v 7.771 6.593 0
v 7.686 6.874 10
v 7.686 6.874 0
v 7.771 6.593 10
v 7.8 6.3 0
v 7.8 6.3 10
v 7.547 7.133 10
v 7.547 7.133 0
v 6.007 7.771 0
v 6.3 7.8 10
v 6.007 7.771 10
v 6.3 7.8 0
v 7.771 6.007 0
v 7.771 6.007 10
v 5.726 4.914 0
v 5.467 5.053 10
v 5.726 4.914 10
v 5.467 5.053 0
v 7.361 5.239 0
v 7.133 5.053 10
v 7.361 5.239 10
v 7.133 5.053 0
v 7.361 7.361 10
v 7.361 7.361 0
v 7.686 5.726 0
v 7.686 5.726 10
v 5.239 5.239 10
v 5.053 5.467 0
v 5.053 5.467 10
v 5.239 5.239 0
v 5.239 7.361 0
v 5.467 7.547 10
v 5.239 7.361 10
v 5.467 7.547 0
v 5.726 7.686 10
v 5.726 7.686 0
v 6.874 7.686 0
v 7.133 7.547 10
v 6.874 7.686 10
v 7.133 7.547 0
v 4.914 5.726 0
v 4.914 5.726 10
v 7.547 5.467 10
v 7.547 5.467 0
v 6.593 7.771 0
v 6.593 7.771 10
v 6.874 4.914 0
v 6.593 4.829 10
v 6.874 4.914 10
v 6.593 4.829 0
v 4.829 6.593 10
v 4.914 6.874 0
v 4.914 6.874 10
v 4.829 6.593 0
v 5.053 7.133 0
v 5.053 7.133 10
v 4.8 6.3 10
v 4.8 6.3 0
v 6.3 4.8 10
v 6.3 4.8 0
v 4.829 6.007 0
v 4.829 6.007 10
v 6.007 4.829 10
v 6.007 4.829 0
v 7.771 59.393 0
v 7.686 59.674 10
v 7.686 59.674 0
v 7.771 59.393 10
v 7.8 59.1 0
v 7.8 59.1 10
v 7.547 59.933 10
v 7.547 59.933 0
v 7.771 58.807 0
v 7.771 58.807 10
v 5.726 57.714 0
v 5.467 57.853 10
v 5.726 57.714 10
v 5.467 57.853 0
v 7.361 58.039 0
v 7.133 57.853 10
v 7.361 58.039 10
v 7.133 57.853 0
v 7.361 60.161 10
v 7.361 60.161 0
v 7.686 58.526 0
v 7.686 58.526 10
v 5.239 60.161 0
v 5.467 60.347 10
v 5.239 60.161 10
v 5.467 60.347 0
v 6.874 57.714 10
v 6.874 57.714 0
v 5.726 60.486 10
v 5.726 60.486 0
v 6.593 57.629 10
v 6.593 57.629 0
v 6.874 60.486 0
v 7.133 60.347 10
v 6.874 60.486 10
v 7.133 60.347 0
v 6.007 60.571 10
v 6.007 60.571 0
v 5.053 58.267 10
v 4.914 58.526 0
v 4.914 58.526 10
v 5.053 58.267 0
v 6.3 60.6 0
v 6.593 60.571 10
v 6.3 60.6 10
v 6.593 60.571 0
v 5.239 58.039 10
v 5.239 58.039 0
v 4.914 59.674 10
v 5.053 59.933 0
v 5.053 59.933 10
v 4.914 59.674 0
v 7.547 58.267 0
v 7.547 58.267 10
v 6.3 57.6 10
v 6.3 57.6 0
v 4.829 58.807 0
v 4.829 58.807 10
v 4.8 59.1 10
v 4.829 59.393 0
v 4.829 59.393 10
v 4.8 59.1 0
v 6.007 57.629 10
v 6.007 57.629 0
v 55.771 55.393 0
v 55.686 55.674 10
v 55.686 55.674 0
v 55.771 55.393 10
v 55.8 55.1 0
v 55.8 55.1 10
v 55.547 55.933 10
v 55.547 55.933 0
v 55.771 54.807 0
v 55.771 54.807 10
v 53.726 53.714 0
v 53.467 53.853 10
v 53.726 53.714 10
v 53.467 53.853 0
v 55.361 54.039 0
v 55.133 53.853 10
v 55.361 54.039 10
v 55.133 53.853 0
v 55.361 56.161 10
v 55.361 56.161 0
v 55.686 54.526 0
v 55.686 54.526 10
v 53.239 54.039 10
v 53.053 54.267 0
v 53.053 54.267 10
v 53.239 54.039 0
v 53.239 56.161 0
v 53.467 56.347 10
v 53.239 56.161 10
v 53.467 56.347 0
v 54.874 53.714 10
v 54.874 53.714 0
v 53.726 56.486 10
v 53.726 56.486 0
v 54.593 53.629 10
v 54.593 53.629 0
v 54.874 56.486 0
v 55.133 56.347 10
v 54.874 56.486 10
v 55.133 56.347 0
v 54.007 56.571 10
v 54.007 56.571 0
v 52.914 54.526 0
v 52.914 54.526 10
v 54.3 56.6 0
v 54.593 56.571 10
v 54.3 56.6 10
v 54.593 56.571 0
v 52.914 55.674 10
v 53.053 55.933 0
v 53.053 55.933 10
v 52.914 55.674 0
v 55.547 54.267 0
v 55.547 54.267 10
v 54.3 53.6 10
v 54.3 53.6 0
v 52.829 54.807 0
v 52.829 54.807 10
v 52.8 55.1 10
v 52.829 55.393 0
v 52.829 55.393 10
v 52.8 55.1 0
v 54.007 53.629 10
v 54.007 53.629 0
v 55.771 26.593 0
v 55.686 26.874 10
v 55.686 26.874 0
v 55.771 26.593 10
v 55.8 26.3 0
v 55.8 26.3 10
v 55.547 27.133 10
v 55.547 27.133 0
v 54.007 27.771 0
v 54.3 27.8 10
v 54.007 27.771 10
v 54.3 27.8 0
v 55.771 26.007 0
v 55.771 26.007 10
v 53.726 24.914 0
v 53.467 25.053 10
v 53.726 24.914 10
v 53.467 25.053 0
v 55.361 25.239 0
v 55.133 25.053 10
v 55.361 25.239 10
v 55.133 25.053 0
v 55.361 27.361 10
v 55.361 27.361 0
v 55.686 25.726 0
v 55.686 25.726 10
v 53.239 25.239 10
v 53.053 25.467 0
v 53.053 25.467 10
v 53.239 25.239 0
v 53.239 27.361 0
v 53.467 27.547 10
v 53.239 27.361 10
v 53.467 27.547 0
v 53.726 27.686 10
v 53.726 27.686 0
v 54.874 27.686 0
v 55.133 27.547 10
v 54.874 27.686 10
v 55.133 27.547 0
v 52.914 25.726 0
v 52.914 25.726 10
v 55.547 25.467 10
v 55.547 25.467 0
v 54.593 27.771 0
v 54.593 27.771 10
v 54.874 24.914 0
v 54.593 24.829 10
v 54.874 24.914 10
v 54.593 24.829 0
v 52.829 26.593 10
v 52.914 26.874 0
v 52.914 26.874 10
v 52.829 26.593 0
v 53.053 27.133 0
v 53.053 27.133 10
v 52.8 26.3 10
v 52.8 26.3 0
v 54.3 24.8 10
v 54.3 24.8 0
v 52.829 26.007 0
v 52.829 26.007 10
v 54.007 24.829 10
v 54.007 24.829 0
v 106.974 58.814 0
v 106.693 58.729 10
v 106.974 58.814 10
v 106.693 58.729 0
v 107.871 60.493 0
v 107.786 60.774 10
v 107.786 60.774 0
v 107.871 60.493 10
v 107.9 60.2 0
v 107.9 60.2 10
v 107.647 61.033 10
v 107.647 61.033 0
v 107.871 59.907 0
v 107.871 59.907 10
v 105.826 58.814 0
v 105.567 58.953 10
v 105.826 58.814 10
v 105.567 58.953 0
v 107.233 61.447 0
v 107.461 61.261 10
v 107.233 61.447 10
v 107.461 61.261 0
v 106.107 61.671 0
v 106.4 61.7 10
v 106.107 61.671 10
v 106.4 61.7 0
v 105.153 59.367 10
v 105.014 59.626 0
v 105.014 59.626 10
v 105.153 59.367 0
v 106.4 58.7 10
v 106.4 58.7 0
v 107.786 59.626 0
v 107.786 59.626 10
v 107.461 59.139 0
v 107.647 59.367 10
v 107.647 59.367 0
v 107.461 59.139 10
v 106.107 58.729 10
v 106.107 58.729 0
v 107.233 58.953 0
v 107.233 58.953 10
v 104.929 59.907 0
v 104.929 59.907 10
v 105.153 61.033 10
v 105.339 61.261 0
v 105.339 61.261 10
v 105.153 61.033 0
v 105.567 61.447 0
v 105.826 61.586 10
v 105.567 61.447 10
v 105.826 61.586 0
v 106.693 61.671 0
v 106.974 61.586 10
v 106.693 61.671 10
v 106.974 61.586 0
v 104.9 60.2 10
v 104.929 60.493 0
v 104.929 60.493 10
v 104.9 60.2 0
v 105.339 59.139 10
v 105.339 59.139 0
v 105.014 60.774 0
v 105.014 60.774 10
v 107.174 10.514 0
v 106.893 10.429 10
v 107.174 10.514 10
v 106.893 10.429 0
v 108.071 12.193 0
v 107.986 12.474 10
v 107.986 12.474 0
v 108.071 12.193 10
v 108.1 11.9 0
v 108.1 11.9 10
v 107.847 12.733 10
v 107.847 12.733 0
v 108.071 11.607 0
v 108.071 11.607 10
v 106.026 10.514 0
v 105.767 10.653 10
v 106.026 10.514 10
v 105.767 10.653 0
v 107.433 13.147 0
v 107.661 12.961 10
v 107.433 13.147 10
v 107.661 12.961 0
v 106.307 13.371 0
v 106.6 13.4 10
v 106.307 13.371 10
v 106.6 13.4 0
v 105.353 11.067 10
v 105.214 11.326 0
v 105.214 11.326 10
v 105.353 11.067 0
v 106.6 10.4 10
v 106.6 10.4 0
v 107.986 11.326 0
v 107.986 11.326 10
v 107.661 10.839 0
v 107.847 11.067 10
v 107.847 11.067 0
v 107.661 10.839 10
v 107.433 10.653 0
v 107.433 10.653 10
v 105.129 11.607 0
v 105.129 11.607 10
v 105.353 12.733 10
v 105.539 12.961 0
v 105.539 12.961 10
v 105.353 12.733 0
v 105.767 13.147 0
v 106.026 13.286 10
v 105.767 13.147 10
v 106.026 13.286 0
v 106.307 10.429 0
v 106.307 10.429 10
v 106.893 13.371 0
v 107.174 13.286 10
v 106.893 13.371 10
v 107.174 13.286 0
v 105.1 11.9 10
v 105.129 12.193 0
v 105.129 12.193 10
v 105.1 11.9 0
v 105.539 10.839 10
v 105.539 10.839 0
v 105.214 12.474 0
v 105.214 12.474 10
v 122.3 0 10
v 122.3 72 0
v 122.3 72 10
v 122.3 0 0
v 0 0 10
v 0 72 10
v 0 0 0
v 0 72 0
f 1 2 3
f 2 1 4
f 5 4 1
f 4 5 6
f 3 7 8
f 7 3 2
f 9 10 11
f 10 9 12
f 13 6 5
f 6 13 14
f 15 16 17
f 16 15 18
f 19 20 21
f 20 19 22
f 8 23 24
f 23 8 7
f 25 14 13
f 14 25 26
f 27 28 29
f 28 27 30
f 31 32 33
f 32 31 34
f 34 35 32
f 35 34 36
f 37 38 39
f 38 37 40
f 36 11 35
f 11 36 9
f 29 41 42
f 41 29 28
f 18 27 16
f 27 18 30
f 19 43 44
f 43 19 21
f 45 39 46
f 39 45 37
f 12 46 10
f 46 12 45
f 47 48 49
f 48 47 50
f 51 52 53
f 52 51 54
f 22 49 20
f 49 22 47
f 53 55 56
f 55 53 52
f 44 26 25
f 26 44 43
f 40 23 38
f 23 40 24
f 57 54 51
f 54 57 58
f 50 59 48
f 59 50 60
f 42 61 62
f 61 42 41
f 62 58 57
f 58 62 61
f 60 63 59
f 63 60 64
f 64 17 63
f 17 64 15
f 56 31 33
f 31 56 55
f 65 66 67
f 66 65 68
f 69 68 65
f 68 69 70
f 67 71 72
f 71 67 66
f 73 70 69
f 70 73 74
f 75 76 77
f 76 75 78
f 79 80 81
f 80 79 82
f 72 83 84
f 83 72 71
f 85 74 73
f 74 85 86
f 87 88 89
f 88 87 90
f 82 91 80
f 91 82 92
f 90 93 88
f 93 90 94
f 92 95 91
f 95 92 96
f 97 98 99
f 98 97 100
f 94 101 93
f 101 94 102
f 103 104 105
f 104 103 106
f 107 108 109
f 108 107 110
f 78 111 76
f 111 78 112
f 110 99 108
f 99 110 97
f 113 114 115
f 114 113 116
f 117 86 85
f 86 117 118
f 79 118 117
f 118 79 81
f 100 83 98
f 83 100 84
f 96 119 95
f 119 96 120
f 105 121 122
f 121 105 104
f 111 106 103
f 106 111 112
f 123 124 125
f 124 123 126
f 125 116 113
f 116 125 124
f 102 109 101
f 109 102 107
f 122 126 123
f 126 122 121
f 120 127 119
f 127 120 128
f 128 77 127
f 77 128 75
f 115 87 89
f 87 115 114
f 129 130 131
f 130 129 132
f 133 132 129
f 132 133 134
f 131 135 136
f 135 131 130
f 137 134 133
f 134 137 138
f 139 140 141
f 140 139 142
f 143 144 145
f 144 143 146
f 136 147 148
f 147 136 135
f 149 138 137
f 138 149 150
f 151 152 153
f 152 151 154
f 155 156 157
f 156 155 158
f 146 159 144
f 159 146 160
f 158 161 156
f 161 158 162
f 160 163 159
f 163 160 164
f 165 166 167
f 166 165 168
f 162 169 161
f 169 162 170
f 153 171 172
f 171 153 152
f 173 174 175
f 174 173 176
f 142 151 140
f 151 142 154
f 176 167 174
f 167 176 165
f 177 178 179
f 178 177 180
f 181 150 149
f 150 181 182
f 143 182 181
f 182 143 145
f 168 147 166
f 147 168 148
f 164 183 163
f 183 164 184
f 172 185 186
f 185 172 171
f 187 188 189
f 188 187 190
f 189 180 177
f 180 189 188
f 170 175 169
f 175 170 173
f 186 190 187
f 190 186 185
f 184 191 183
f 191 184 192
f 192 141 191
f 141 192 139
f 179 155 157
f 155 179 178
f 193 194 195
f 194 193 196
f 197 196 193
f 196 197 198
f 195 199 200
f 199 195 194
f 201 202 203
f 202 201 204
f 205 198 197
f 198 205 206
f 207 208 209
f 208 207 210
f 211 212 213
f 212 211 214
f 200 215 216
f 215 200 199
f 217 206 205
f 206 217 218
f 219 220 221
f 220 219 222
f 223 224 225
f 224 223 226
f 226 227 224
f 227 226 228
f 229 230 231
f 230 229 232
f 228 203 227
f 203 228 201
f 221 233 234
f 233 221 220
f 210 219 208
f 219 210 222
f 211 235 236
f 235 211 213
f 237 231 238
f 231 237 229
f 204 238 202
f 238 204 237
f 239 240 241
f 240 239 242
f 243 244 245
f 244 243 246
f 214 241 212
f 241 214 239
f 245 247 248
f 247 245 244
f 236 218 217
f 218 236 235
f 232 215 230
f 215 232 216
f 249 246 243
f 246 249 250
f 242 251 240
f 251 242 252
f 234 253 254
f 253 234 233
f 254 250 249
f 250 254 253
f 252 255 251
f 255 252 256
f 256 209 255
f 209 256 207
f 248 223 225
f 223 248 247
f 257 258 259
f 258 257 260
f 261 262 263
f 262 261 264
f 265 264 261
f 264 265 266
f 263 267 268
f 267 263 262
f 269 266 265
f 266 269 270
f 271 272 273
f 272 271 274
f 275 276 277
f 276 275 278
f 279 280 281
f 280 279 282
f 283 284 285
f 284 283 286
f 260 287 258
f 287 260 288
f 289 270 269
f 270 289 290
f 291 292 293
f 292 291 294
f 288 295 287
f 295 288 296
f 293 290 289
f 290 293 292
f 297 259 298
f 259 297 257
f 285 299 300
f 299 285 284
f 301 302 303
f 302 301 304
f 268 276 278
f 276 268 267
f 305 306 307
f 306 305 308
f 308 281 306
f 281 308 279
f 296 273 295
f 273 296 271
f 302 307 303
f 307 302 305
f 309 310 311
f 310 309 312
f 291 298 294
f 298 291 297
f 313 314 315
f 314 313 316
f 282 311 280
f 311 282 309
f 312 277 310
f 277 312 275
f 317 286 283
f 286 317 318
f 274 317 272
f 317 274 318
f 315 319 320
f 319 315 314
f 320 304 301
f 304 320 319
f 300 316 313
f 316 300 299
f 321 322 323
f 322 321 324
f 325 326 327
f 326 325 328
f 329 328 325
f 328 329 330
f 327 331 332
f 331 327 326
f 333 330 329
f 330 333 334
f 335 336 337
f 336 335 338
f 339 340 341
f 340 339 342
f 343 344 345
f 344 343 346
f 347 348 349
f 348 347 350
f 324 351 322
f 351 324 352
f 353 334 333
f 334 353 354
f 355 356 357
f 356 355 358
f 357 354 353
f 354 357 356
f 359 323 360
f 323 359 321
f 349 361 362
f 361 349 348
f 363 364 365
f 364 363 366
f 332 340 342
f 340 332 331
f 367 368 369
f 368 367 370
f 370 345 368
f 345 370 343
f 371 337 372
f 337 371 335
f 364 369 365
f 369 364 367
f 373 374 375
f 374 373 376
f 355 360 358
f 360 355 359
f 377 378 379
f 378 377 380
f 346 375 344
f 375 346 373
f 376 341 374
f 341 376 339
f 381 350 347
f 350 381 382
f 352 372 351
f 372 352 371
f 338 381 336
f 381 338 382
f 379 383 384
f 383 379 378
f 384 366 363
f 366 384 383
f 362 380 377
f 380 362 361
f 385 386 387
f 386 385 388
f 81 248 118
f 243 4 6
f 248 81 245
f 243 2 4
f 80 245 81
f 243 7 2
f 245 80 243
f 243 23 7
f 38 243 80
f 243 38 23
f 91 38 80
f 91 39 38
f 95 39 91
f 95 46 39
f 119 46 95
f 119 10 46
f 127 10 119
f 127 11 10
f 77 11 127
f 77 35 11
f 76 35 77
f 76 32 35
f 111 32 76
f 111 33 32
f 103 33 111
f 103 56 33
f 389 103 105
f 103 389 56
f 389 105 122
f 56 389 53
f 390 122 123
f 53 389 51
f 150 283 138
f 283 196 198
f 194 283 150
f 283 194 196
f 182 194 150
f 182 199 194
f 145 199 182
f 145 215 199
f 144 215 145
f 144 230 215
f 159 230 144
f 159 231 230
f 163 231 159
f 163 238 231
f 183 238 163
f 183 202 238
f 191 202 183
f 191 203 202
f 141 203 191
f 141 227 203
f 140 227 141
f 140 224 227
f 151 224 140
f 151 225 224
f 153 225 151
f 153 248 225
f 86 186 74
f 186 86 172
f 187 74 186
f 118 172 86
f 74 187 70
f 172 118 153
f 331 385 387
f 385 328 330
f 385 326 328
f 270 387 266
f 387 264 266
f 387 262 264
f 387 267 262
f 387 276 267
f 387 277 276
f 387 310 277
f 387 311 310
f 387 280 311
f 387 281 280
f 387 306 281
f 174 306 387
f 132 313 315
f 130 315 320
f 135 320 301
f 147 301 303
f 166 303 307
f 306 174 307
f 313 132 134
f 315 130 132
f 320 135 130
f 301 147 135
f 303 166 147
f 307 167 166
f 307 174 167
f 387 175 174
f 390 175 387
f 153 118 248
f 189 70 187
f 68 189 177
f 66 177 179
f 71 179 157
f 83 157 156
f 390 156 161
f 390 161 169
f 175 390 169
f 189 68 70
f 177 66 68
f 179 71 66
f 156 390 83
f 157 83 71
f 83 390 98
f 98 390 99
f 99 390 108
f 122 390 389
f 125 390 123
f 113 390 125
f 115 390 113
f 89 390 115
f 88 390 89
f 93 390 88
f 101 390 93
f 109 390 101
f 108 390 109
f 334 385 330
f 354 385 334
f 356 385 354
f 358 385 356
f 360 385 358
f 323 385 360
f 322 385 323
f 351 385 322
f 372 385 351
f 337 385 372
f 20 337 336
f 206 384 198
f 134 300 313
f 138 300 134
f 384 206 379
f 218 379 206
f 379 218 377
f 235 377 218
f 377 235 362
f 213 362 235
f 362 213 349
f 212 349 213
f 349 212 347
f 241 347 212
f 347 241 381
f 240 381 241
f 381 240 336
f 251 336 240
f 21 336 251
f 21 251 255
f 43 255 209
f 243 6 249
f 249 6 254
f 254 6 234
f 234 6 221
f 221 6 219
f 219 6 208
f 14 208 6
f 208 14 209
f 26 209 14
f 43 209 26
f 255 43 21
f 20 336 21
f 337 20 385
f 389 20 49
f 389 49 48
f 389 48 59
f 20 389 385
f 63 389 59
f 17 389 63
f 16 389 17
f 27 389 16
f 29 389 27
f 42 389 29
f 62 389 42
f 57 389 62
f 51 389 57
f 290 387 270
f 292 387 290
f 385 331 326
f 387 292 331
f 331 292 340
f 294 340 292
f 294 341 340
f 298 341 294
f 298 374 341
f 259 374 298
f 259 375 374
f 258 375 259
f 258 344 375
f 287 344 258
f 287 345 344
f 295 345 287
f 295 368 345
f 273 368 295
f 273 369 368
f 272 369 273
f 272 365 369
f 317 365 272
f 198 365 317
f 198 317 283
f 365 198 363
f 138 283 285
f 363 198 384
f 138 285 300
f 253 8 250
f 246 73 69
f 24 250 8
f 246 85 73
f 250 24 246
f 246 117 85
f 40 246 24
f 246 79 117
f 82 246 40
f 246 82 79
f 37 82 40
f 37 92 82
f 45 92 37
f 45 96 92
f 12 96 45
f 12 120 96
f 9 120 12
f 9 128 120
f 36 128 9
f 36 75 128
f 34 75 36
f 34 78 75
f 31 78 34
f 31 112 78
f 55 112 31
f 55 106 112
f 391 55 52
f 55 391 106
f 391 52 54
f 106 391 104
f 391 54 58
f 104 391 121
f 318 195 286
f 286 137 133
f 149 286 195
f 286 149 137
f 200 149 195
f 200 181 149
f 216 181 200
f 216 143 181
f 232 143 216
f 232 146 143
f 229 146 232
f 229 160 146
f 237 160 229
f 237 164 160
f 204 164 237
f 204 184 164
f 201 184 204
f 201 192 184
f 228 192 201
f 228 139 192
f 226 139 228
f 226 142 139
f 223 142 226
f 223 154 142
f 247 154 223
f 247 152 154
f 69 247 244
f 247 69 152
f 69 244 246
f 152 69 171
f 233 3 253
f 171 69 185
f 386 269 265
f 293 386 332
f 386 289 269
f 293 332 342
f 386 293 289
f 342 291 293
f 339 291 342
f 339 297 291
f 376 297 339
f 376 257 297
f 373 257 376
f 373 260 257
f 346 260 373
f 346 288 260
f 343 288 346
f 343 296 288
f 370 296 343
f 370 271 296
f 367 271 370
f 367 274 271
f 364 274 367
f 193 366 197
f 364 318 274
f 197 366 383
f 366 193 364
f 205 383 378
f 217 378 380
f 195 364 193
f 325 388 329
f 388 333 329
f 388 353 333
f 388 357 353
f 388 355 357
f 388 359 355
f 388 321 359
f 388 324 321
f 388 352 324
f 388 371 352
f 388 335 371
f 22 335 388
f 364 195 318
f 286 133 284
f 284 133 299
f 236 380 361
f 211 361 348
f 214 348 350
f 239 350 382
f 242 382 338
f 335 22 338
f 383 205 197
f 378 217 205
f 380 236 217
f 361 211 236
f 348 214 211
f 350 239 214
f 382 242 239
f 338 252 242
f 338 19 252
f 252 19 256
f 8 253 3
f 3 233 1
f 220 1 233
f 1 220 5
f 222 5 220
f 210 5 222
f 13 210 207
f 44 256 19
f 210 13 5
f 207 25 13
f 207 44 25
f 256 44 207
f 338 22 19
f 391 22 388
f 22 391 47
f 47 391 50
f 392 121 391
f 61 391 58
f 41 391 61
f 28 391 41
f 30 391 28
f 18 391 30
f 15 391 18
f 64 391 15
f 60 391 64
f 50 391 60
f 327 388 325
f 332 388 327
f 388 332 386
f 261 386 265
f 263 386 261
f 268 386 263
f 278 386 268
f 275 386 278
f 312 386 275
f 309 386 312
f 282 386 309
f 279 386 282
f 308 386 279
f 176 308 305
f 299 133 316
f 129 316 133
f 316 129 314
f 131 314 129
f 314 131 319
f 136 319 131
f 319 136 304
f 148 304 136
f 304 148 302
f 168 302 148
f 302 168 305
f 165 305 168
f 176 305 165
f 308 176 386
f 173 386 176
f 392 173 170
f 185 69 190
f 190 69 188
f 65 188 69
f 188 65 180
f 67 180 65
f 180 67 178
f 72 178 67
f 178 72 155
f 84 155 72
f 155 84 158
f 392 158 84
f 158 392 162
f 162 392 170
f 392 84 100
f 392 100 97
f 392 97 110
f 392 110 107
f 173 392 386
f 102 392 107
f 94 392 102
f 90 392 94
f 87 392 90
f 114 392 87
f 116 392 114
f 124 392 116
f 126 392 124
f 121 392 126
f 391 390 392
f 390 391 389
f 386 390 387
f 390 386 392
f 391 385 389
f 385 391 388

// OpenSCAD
// file: dimensions.scad
arduino_board_dim = [116 + 6.3, 65.7 + 6.3, 10];

arduino_board_mounting_holes_r = 3 / 2;
arduino_board_mounting_holes_pos = [
    [0 + 6.3, 0 + 6.3],
    [0 + 6.3, 52.8 + 6.3],
    [48 + 6.3, 48.8 + 6.3],
    [48 + 6.3, 20 + 6.3],
    [100.1 + 6.3, 53.9 + 6.3],
    [100.3 + 6.3, 5.6 + 6.3]
];

camera_base_r = 50 / 2;
camera_base_h = 3;
camera_base_cut = 15;
camera_foot_r = 15 / 2;
camera_foot_h = 3;
camera_sphere_r = 30 / 2;
camera_objective_r = [18 / 2, 16 / 2];
camera_objective_l = 10;
camera_top_dim = [10, 70, 30];
camera_mic_grid_dim = [10, 50, 10];
// main file
include <dimensions.scad>

module arduino_board()
{
    difference()
    {
        cube(arduino_board_dim);
        for(i = [0 : len(arduino_board_mounting_holes_pos) - 1])
        {
            translate([arduino_board_mounting_holes_pos[i][0],
                    arduino_board_mounting_holes_pos[i][1],
                    -1])
            cylinder(h = arduino_board_dim[2] + 2, r = arduino_board_mounting_holes_r, $fn = 32);
        }
    }
}

arduino_board();
